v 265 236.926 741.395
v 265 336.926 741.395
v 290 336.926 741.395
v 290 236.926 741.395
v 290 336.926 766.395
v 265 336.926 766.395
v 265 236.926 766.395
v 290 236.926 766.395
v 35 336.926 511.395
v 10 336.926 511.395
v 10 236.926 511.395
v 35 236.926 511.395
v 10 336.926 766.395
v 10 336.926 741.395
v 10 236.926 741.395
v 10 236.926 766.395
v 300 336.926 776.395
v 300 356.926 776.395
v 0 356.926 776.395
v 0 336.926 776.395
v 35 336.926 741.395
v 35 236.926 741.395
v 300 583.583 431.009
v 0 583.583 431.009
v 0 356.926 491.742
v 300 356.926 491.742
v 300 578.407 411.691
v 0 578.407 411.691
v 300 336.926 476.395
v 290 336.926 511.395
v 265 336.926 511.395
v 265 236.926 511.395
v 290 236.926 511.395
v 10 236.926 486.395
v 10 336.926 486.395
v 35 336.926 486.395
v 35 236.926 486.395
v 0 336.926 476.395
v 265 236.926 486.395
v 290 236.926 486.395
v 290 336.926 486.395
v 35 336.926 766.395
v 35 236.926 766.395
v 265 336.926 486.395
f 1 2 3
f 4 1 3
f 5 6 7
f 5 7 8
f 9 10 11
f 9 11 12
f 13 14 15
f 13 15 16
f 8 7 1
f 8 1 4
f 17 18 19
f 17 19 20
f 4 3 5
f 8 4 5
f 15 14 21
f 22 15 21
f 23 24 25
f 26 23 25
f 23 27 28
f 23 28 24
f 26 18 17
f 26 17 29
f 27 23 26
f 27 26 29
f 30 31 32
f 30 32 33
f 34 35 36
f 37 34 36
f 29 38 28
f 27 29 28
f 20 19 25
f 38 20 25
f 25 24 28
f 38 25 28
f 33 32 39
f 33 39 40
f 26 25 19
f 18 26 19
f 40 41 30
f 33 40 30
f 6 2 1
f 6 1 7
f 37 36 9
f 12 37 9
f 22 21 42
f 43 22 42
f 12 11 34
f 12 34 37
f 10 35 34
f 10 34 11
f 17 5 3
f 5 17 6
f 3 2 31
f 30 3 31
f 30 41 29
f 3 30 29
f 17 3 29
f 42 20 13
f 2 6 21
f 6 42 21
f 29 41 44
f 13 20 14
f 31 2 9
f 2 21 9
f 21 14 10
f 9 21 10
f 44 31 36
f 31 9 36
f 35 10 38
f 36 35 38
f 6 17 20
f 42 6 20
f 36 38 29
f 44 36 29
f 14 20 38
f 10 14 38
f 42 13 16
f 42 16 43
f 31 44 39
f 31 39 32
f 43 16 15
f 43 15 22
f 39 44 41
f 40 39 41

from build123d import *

# Parameters (mm, degrees)
BOSS_EXTRUDE1_DEPTH = 300
SKETCH6_W           = 25
SKETCH6_H           = 25
BOSS_EXTRUDE2_DEPTH = 100


with BuildPart() as part:
    # Sketch3 → Boss-Extrude1 (new body)
    with BuildSketch(Plane(origin=(0, 0, 0), x_dir=(0, 0, -1), z_dir=(1, 0, 0))):
        Polygon((-476.395417156, 336.925610034), (-411.69065588, 578.407066606), (-431.009172406, 583.583447508), (-491.741956916, 356.925610034), (-776.395417156, 356.925610034), (-776.395417156, 336.925610034), align=None)
    extrude(amount=BOSS_EXTRUDE1_DEPTH)

    # Sketch6 → Boss-Extrude2 (add)
    with BuildSketch(Plane.XZ.offset(-336.925610034)):
        with Locations((277.5, 753.895417156)):
            Rectangle(SKETCH6_W, SKETCH6_H)
        with Locations((22.5, 753.895417156)):
            Rectangle(SKETCH6_W, SKETCH6_H)
        with Locations((277.5, 498.895417156)):
            Rectangle(SKETCH6_W, SKETCH6_H)
        with Locations((22.5, 498.895417156)):
            Rectangle(SKETCH6_W, SKETCH6_H)
    extrude(amount=BOSS_EXTRUDE2_DEPTH)


solid = part.part
